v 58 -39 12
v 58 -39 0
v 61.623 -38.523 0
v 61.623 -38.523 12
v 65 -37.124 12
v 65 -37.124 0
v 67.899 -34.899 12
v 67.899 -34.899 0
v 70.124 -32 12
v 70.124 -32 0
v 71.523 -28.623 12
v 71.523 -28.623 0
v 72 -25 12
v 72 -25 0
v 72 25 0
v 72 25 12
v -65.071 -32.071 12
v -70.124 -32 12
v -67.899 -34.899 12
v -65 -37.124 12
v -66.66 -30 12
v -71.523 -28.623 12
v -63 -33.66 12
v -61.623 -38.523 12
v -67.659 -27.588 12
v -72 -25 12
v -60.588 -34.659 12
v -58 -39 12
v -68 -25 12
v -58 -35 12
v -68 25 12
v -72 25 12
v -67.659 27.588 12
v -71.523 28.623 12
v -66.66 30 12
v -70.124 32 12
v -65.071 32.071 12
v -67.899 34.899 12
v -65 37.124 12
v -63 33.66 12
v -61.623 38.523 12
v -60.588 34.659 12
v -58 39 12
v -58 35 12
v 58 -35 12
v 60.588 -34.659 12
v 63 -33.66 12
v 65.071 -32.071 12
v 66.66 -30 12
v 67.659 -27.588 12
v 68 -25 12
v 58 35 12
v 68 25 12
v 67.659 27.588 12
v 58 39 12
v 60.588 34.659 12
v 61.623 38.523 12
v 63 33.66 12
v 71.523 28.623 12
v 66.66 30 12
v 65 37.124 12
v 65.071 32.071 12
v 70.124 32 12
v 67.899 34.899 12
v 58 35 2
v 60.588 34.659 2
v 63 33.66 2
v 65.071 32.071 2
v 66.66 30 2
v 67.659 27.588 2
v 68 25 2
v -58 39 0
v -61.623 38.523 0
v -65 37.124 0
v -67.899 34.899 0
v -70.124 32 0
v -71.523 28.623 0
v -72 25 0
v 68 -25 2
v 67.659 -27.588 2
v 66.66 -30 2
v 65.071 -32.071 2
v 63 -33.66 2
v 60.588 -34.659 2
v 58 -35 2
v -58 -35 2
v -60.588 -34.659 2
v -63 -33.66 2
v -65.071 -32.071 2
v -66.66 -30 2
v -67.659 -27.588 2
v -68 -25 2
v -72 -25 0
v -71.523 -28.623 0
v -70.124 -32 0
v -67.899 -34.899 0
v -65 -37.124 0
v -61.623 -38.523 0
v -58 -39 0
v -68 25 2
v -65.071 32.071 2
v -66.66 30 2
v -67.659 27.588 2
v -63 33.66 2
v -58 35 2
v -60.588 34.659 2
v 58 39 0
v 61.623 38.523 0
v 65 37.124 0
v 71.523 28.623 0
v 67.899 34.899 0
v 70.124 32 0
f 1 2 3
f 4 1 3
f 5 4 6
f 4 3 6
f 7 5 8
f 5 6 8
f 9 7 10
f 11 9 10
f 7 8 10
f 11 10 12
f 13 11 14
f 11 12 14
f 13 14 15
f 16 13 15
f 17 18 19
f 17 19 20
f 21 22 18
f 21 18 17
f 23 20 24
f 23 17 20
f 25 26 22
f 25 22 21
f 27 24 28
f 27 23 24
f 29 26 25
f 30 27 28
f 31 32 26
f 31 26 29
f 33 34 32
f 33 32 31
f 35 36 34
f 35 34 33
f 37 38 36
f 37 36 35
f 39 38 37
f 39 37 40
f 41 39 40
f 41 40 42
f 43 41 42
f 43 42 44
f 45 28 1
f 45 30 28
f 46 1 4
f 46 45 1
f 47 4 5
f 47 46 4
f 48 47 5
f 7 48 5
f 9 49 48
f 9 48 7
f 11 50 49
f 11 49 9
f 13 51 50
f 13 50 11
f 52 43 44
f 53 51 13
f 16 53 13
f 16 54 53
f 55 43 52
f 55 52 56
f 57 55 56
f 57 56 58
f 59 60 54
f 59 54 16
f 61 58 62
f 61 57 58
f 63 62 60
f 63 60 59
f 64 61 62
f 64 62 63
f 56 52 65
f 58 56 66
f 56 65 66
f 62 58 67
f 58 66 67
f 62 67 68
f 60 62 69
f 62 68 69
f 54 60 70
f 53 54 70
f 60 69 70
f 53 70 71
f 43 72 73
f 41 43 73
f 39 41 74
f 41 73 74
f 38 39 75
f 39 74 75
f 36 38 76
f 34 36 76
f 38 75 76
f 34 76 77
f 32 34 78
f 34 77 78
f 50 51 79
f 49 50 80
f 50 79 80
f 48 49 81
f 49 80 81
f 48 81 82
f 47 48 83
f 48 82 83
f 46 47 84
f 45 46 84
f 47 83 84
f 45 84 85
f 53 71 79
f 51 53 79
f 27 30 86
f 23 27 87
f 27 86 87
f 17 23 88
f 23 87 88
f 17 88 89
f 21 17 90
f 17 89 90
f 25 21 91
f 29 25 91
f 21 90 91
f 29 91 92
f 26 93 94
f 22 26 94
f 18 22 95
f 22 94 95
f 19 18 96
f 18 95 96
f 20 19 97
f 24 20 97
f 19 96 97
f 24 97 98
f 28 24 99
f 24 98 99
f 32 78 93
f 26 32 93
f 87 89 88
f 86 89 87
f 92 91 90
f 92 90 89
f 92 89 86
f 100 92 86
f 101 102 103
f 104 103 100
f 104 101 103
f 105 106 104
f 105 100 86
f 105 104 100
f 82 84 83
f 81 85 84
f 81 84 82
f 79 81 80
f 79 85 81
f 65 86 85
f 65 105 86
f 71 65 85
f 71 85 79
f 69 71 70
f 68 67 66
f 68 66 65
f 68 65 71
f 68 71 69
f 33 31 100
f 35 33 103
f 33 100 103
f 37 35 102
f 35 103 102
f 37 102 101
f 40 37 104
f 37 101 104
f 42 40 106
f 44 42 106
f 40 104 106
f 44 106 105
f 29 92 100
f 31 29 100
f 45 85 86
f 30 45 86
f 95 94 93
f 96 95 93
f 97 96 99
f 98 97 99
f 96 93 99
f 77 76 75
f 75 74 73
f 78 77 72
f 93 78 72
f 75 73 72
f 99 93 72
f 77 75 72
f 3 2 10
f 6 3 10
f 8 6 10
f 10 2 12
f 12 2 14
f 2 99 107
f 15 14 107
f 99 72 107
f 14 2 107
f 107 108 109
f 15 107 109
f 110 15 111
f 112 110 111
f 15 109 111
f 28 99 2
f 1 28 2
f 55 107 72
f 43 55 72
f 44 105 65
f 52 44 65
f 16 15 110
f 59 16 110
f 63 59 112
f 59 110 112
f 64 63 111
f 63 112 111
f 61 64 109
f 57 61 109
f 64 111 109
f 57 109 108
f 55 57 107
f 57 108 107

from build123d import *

# Parameters (mm, degrees)
F1_DEPTH = 2
F2_DEPTH = 12


with BuildPart() as f1:
    # F0 (on Top) → F1 (new body)
    with BuildSketch(Plane.XY):
        with BuildLine():
            ThreePointArc((-68, -25), (-65.071068, -32.071068), (-58, -35))
            Line((-58, -35), (58, -35))
            ThreePointArc((58, -35), (65.071068, -32.071068), (68, -25))
            Line((68, -25), (68, 25))
            ThreePointArc((68, 25), (65.071068, 32.071068), (58, 35))
            Line((58, 35), (-58, 35))
            ThreePointArc((-58, 35), (-65.071068, 32.071068), (-68, 25))
            Line((-68, 25), (-68, -25))
        make_face()
    extrude(amount=F1_DEPTH)

    # F0 (on Top) → F2 (join)
    with BuildSketch(Plane.XY):
        with BuildLine():
            Line((58, 39), (-58, 39))
            ThreePointArc((-58, 39), (-67.899495, 34.899495), (-72, 25))
            Line((-72, 25), (-72, -25))
            ThreePointArc((-72, -25), (-67.899495, -34.899495), (-58, -39))
            Line((-58, -39), (58, -39))
            ThreePointArc((58, -39), (67.899495, -34.899495), (72, -25))
            Line((72, -25), (72, 25))
            ThreePointArc((72, 25), (67.899495, 34.899495), (58, 39))
        make_face()
        with BuildLine():
            Line((58, -35), (-58, -35))
            ThreePointArc((-58, -35), (-65.071068, -32.071068), (-68, -25))
            Line((-68, -25), (-68, 25))
            ThreePointArc((-68, 25), (-65.071068, 32.071068), (-58, 35))
            Line((-58, 35), (58, 35))
            ThreePointArc((58, 35), (65.071068, 32.071068), (68, 25))
            Line((68, 25), (68, -25))
            ThreePointArc((68, -25), (65.071068, -32.071068), (58, -35))
        make_face(mode=Mode.SUBTRACT)
    extrude(amount=F2_DEPTH)


solid = f1.part
